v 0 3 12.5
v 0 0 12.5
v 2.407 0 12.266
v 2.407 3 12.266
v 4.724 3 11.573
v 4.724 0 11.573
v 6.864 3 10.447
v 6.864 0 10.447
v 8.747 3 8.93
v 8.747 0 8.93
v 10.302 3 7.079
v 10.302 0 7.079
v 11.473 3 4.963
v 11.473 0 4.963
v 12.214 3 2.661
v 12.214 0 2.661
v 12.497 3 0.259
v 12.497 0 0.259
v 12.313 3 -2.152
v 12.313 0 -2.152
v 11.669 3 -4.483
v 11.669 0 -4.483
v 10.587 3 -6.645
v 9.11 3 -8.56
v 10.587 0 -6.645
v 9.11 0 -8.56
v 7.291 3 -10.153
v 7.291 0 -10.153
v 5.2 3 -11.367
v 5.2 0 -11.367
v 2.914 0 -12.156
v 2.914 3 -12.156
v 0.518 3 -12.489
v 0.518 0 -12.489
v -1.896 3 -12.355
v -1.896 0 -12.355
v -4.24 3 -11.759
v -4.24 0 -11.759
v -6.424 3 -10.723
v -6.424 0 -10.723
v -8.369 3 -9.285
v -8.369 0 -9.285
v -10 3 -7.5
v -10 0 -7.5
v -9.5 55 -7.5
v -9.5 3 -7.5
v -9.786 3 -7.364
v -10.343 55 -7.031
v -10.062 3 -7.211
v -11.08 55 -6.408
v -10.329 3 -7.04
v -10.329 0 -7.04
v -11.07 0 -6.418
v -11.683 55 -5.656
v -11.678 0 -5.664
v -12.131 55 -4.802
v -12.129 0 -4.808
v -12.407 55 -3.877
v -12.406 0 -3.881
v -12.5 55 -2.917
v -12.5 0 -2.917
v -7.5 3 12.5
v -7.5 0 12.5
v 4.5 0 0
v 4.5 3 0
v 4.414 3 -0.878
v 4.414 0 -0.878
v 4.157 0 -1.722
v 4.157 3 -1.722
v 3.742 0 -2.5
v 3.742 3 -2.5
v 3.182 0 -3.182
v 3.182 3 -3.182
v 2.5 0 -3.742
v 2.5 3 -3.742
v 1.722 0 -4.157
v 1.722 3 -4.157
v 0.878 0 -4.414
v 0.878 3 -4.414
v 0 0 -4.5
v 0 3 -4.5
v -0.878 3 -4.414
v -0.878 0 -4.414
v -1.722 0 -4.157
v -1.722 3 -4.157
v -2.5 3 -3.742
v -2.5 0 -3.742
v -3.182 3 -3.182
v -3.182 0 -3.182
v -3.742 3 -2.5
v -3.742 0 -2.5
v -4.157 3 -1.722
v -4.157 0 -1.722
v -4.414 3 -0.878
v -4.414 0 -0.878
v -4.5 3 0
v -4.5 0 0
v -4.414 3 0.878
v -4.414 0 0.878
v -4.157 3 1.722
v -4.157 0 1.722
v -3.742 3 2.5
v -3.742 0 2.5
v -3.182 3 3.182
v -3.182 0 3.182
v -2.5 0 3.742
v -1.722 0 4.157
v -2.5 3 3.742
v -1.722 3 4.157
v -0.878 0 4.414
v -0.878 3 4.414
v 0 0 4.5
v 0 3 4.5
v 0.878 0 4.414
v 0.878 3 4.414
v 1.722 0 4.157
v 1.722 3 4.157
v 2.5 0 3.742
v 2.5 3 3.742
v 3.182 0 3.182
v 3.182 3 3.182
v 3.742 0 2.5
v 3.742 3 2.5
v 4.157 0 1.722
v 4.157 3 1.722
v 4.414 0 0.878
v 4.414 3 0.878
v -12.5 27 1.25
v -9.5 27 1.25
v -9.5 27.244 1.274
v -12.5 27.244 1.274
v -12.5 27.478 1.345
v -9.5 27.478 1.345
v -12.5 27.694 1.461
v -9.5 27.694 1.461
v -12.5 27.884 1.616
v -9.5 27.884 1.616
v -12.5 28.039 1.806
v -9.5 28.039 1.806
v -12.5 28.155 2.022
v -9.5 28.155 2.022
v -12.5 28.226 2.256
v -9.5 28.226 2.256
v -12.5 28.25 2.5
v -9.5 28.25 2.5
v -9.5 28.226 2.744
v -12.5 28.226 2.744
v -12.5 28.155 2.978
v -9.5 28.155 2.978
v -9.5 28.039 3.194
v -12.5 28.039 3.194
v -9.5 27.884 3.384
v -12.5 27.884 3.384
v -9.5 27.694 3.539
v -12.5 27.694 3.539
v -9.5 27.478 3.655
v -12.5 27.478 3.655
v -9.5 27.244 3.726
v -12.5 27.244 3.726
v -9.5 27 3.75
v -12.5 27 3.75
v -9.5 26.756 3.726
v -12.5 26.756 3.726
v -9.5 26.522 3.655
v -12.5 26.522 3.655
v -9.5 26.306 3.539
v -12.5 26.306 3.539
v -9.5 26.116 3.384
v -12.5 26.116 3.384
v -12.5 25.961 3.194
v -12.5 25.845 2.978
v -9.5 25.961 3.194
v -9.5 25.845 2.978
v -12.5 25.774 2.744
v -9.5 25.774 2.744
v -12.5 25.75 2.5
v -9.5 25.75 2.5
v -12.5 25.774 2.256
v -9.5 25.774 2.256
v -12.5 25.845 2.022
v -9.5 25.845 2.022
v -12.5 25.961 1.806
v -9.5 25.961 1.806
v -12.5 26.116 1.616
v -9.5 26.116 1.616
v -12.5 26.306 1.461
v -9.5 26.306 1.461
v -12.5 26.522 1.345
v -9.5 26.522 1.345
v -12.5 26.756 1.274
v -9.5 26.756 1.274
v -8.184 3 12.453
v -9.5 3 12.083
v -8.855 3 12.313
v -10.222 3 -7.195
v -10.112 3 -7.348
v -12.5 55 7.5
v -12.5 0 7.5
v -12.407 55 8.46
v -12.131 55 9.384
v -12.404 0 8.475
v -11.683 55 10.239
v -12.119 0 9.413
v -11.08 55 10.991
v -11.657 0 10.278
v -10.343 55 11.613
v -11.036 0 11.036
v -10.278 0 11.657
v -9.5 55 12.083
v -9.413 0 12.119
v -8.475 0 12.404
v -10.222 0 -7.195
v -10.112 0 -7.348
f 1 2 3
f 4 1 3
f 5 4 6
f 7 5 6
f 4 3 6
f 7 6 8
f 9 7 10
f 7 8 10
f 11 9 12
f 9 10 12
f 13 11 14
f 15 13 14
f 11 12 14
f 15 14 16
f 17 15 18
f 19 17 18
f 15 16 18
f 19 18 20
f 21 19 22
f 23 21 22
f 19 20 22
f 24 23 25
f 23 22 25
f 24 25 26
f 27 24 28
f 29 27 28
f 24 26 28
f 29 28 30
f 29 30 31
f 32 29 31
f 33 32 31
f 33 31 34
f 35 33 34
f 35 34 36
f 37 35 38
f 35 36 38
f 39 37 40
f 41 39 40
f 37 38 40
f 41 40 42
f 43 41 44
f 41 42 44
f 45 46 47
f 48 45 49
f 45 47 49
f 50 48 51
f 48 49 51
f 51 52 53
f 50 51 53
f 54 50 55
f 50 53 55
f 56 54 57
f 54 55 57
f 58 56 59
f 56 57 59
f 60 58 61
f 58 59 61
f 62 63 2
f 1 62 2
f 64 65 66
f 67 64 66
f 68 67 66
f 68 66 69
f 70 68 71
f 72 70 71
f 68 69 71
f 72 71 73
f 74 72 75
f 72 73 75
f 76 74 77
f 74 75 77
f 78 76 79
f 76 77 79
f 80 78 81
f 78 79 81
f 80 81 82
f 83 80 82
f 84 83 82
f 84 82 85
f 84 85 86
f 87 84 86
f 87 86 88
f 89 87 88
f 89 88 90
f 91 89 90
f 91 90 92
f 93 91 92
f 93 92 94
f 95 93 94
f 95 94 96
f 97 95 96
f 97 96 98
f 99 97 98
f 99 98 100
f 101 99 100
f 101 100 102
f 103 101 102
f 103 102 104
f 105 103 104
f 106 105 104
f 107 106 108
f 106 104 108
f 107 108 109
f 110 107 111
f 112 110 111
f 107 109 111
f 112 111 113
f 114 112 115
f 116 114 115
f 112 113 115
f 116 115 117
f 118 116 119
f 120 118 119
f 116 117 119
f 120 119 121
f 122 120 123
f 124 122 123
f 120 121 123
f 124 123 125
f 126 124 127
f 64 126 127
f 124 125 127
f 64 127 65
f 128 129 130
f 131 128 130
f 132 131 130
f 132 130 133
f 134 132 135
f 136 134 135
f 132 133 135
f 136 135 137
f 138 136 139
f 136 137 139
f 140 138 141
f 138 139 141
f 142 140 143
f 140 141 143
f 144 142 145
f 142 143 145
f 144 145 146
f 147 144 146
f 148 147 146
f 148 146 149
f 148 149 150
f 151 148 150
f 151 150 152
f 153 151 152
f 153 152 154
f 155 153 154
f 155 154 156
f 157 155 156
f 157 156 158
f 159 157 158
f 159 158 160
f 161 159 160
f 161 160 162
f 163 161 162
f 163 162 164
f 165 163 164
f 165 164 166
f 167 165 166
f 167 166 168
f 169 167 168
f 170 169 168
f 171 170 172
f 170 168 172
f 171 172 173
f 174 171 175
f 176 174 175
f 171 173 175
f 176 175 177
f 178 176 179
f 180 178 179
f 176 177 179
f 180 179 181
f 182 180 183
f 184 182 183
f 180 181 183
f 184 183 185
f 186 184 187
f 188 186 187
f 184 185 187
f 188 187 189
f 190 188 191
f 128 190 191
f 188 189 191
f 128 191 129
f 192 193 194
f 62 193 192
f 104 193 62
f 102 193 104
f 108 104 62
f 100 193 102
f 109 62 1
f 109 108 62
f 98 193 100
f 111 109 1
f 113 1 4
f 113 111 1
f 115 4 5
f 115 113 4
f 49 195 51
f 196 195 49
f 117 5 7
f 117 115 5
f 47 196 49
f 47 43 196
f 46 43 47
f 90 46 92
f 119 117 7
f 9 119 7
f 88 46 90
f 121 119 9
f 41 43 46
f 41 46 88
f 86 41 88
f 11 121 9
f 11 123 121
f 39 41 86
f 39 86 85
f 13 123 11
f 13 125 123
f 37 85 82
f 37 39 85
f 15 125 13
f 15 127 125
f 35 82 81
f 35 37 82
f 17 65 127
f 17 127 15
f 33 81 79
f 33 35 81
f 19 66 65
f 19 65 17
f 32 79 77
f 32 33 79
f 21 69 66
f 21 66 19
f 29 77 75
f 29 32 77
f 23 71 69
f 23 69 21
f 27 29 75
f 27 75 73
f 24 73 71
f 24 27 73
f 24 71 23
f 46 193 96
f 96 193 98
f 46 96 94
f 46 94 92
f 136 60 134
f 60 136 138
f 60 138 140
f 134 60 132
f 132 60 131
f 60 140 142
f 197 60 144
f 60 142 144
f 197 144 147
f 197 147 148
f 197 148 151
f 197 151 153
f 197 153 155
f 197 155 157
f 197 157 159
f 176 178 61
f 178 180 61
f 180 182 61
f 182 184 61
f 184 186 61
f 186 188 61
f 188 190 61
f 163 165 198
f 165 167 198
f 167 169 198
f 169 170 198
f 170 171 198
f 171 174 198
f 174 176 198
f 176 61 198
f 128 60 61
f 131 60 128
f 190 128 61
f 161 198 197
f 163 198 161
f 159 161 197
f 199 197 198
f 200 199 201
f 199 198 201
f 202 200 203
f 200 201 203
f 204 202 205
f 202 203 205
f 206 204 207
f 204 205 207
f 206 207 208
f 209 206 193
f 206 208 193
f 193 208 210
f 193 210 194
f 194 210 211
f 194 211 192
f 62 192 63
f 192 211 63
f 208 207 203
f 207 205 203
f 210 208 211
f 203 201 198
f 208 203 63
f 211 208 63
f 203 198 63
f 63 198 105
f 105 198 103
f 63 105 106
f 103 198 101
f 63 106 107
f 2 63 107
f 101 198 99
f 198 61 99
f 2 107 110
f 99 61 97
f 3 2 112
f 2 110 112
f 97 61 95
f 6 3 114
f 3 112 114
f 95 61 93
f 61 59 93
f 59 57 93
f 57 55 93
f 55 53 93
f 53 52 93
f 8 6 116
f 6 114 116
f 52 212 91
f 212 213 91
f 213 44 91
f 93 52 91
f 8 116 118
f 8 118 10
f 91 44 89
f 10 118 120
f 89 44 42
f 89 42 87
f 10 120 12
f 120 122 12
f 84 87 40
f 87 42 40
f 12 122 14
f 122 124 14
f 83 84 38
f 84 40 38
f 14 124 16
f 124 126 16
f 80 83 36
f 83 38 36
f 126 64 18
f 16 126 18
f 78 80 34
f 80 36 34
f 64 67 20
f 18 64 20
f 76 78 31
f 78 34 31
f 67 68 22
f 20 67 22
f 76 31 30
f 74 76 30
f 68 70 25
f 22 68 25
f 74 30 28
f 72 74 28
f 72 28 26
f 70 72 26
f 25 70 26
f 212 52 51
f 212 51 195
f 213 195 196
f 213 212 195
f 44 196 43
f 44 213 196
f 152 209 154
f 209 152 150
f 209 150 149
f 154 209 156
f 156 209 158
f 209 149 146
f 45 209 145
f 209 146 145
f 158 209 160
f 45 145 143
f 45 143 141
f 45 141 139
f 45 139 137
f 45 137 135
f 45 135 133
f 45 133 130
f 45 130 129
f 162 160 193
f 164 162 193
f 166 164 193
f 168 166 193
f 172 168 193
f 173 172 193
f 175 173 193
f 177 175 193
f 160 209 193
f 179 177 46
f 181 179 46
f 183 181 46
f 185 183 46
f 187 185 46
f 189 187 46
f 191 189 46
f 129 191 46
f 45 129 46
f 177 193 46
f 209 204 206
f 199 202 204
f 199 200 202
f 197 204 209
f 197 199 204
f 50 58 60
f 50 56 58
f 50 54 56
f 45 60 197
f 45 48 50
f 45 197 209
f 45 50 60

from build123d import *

# Parameters (mm, degrees)
BOSS_EXTRUDE1_DEPTH         = 3
SKETCH1_4_W                 = 3
SKETCH1_4_H                 = 20
BOSS_EXTRUDE3_DEPTH         = 55
M8_CLEARANCE_HOLE1_D        = 9
TAP_DRILL_FOR_M3X0_5_TAP1_D = 2.5
FILLET1_R                   = 5


with BuildPart() as part:
    # Sketch1 → Boss-Extrude1 (new body)
    with BuildSketch(Plane(origin=(0, 0, 0), x_dir=(1, 0, 0), z_dir=(0, 1, 0))):
        with BuildLine():
            Line((-12.5, -12.5), (0, -12.5))
            ThreePointArc((0, -12.5), (11.180339887, 5.590169944), (-10, 7.5))
            Line((-10, 7.5), (-12.5, 7.5))
            Line((-12.5, 7.5), (-12.5, -12.5))
        make_face()
    extrude(amount=BOSS_EXTRUDE1_DEPTH)

    # Sketch1<4> → Boss-Extrude3 (add)
    with BuildSketch(Plane(origin=(0, 0, 0), x_dir=(1, 0, 0), z_dir=(0, 1, 0))):
        with Locations((-11, -2.5)):
            Rectangle(SKETCH1_4_W, SKETCH1_4_H)
    extrude(amount=BOSS_EXTRUDE3_DEPTH)

    # M8 Clearance Hole1 (through all)
    with Locations(Plane(origin=(0, 0, 0), x_dir=(-1, 0, 0), z_dir=(0, -1, 0))):
        with Locations((0, 0)):
            Hole(M8_CLEARANCE_HOLE1_D / 2)

    # Tap Drill for M3x0.5 Tap1 (through all)
    with Locations(Plane.ZY.offset(12.5)):
        with Locations((2.5, 27)):
            Hole(TAP_DRILL_FOR_M3X0_5_TAP1_D / 2)

    # Fillet1
    # the kernel refuses this fillet: 5 mm, written as the material it takes off along each edge
    with BuildSketch(Plane(origin=(-12.5, -12.5, 12.5), x_dir=(0, 0, -1), z_dir=(0, 1, 0))) as fillet1_piece_1:
        with BuildLine():
            CenterArc((FILLET1_R, -FILLET1_R), FILLET1_R, 90, 90)
            Line((0, -FILLET1_R), (0, 0))
            Line((0, 0), (FILLET1_R, 0))
        make_face()
    extrude(amount=80, mode=Mode.SUBTRACT)
    with BuildSketch(Plane(origin=(-12.5, -11.456439237, -7.5), x_dir=(1, 0, 0), z_dir=(0, 1, 0))) as fillet1_piece_2_section:
        with BuildLine():
            CenterArc((5, -4.582575695), FILLET1_R, 113.578178478, 66.421821522)
            Line((0, -4.582575695), (0, 0))
            Line((0, 0), (3, 0))
        make_face()
    fillet1_piece_2 = extrude(amount=77.912878475, mode=Mode.PRIVATE)
    fillet1_piece_2 = fillet1_piece_2 - Plane(origin=(0, -11.456439237, 0), x_dir=(0, 0, 1), z_dir=(0, -1, 0)) * Cylinder(12.5, 175, mode=Mode.PRIVATE)
    add(fillet1_piece_2, mode=Mode.SUBTRACT)
    with BuildSketch(Plane(origin=(-12.5, -11.456439237, -7.5), x_dir=(1, 0, 0), z_dir=(0, 1, 0))) as fillet1_piece_3_section:
        with BuildLine():
            CenterArc((5, -4.582575695), FILLET1_R, 113.578178478, 66.421821522)
            Line((0, -4.582575695), (0, 0))
            Line((0, 0), (3, 0))
        make_face()
    fillet1_piece_3 = extrude(amount=77.912878475, mode=Mode.PRIVATE)
    fillet1_piece_3 = split(fillet1_piece_3, bisect_by=Plane(origin=(-12.5, 3, -7.5), z_dir=(0, 1, 0)), keep=Keep.TOP, mode=Mode.PRIVATE)
    add(fillet1_piece_3, mode=Mode.SUBTRACT)


solid = part.part
